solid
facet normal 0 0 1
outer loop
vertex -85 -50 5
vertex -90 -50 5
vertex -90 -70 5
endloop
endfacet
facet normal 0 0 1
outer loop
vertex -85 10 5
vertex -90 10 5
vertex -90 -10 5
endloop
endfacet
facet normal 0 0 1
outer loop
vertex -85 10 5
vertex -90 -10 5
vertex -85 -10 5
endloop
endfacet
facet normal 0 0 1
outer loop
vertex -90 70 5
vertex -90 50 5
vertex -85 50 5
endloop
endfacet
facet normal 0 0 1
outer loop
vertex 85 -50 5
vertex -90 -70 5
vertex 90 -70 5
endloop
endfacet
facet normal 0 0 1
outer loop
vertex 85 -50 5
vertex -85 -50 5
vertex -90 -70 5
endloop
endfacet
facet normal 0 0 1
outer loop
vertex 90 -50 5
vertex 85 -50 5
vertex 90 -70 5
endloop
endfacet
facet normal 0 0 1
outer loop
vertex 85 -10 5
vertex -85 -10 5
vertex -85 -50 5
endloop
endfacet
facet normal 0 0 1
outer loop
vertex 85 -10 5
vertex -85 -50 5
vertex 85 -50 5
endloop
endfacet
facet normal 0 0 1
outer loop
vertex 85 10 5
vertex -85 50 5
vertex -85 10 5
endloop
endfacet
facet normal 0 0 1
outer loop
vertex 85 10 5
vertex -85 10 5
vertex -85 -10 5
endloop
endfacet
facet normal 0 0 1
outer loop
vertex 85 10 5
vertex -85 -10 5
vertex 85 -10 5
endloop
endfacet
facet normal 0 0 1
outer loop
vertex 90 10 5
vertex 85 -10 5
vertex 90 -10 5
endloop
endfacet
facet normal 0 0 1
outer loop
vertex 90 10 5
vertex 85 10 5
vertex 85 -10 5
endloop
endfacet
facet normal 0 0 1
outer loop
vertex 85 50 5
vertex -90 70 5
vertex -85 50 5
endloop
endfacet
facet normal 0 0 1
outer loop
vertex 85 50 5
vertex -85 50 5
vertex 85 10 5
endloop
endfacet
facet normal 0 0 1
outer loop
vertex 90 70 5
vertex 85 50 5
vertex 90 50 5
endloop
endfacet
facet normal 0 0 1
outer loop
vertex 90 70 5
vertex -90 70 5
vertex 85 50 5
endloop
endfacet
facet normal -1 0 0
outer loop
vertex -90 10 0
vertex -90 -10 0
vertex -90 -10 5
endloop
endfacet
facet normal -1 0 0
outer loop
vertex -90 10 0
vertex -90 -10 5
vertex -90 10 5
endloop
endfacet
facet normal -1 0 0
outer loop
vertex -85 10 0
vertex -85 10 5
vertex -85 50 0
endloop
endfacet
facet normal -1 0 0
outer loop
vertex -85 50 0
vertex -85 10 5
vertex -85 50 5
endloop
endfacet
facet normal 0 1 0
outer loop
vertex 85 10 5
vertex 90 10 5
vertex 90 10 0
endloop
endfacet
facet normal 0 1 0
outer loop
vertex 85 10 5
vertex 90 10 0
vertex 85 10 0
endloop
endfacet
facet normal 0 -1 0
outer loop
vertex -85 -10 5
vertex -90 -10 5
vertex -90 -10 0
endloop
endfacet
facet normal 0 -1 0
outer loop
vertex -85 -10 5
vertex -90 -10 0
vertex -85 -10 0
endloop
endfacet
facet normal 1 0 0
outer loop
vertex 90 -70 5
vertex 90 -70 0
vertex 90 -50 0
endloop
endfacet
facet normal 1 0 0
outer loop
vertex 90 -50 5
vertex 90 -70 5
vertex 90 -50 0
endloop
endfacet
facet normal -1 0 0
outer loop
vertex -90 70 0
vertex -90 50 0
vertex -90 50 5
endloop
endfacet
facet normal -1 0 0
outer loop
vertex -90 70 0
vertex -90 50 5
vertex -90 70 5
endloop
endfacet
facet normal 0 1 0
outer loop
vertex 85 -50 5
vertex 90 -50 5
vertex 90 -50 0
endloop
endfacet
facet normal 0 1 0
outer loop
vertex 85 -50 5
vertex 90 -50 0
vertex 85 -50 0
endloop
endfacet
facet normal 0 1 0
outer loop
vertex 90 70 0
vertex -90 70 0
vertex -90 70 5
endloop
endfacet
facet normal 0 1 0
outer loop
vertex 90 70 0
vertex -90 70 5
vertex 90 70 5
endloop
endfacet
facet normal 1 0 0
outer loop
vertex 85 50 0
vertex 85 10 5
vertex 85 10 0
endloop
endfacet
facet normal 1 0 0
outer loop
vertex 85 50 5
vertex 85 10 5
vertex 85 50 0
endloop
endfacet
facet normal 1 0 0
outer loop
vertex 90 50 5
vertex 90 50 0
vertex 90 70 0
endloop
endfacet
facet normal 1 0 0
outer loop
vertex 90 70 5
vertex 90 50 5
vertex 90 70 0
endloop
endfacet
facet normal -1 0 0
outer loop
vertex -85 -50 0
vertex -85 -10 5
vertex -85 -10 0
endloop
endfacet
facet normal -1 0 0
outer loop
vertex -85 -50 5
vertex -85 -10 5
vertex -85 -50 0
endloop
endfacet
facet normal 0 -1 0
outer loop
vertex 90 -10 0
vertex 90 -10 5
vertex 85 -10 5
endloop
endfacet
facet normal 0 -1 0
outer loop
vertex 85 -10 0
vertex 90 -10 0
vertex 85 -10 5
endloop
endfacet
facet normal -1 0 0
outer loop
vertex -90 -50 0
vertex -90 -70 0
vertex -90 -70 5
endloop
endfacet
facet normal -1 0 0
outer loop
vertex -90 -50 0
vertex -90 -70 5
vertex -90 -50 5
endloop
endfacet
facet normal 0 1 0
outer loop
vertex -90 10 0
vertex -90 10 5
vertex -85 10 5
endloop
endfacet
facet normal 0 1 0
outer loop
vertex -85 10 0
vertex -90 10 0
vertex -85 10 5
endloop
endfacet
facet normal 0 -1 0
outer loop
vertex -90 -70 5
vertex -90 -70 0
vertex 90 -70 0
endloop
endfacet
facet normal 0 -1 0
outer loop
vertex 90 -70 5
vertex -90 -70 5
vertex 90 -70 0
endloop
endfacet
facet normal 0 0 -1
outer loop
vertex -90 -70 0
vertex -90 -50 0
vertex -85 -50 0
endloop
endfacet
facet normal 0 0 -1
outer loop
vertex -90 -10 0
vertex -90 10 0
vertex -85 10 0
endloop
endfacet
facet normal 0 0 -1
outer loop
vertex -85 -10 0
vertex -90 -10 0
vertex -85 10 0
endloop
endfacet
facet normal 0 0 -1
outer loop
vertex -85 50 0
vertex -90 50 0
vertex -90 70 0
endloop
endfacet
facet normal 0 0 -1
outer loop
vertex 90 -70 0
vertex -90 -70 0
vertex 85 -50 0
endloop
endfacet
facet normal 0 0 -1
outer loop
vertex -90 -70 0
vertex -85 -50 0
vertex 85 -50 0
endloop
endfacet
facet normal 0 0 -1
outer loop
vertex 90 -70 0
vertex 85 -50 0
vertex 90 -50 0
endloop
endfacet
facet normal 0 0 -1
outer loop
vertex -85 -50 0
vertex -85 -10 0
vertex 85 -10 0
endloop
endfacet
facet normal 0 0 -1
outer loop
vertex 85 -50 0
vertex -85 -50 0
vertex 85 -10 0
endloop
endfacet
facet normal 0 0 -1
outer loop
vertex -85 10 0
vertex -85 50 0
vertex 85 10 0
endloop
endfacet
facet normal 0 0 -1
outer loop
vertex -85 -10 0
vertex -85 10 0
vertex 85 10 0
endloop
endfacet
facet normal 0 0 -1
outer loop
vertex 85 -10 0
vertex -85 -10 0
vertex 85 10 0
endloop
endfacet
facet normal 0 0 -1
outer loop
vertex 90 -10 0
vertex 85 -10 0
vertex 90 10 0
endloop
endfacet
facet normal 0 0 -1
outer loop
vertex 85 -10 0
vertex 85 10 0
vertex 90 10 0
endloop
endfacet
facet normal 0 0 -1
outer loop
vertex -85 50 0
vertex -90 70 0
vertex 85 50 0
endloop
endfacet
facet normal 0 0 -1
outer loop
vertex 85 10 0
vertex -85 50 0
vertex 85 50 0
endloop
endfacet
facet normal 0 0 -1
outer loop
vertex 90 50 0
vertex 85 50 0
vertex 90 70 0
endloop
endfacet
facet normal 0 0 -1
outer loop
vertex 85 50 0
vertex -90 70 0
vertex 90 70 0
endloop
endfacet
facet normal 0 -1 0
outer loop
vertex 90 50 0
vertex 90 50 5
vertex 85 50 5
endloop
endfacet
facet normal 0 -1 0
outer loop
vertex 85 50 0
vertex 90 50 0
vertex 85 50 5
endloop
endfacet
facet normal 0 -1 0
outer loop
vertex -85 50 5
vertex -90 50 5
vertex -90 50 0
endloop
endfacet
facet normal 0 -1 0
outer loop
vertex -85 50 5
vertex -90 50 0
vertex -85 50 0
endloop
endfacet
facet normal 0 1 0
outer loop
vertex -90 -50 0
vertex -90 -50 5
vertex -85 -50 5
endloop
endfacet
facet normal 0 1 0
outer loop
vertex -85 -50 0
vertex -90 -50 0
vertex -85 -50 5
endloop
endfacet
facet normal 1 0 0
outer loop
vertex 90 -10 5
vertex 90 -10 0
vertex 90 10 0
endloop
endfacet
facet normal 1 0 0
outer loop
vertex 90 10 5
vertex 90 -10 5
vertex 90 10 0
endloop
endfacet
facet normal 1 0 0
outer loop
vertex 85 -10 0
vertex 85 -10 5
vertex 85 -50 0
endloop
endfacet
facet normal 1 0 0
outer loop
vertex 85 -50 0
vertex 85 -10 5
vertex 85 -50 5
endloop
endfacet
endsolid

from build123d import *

# Parameters (mm, degrees)
CROQUIS1_W                = 180
CROQUIS1_H                = 140
SALIENTE_EXTRUIR1_DEPTH   = 5
CROQUIS4_W                = 5
CROQUIS4_H                = 40
CORTAR_EXTRUIR3_DEPTH     = 115.127122105
SIMETR_A5_COPY_1_SKETCH_W = 5
SIMETR_A5_COPY_1_SKETCH_H = 40
SIMETR_A5_COPY_1_DEPTH    = 115.127122105


with BuildPart() as part:
    # Croquis1 → Saliente-Extruir1 (new body)
    with BuildSketch(Plane.XY):
        Rectangle(CROQUIS1_W, CROQUIS1_H)
    extrude(amount=SALIENTE_EXTRUIR1_DEPTH)

    # Croquis4 → Cortar-Extruir3 (cut, through all)
    with BuildSketch(Plane.XY.offset(5)):
        with Locations((-87.5, 30)):
            Rectangle(CROQUIS4_W, CROQUIS4_H)
    cortar_extruir3 = extrude(amount=-CORTAR_EXTRUIR3_DEPTH, mode=Mode.SUBTRACT)

    # Simetría4: Cortar-Extruir3 across plane
    add(cortar_extruir3.mirror(Plane.ZX), mode=Mode.SUBTRACT)

    # Simetría5: Cortar-Extruir3 across plane
    add(cortar_extruir3.mirror(Plane(origin=(0, 0, 0), x_dir=(0, 0, 1), z_dir=(1, 0, 0))), mode=Mode.SUBTRACT)

    # Simetría5 copy 1 sketch → Simetría5 copy 1 (cut, through all)
    with BuildSketch(Plane(origin=(0, 0, 5), x_dir=(-1, 0, 0), z_dir=(0, 0, 1))):
        with Locations((-87.5, 30)):
            Rectangle(SIMETR_A5_COPY_1_SKETCH_W, SIMETR_A5_COPY_1_SKETCH_H)
    extrude(amount=-SIMETR_A5_COPY_1_DEPTH, mode=Mode.SUBTRACT)


solid = part.part
